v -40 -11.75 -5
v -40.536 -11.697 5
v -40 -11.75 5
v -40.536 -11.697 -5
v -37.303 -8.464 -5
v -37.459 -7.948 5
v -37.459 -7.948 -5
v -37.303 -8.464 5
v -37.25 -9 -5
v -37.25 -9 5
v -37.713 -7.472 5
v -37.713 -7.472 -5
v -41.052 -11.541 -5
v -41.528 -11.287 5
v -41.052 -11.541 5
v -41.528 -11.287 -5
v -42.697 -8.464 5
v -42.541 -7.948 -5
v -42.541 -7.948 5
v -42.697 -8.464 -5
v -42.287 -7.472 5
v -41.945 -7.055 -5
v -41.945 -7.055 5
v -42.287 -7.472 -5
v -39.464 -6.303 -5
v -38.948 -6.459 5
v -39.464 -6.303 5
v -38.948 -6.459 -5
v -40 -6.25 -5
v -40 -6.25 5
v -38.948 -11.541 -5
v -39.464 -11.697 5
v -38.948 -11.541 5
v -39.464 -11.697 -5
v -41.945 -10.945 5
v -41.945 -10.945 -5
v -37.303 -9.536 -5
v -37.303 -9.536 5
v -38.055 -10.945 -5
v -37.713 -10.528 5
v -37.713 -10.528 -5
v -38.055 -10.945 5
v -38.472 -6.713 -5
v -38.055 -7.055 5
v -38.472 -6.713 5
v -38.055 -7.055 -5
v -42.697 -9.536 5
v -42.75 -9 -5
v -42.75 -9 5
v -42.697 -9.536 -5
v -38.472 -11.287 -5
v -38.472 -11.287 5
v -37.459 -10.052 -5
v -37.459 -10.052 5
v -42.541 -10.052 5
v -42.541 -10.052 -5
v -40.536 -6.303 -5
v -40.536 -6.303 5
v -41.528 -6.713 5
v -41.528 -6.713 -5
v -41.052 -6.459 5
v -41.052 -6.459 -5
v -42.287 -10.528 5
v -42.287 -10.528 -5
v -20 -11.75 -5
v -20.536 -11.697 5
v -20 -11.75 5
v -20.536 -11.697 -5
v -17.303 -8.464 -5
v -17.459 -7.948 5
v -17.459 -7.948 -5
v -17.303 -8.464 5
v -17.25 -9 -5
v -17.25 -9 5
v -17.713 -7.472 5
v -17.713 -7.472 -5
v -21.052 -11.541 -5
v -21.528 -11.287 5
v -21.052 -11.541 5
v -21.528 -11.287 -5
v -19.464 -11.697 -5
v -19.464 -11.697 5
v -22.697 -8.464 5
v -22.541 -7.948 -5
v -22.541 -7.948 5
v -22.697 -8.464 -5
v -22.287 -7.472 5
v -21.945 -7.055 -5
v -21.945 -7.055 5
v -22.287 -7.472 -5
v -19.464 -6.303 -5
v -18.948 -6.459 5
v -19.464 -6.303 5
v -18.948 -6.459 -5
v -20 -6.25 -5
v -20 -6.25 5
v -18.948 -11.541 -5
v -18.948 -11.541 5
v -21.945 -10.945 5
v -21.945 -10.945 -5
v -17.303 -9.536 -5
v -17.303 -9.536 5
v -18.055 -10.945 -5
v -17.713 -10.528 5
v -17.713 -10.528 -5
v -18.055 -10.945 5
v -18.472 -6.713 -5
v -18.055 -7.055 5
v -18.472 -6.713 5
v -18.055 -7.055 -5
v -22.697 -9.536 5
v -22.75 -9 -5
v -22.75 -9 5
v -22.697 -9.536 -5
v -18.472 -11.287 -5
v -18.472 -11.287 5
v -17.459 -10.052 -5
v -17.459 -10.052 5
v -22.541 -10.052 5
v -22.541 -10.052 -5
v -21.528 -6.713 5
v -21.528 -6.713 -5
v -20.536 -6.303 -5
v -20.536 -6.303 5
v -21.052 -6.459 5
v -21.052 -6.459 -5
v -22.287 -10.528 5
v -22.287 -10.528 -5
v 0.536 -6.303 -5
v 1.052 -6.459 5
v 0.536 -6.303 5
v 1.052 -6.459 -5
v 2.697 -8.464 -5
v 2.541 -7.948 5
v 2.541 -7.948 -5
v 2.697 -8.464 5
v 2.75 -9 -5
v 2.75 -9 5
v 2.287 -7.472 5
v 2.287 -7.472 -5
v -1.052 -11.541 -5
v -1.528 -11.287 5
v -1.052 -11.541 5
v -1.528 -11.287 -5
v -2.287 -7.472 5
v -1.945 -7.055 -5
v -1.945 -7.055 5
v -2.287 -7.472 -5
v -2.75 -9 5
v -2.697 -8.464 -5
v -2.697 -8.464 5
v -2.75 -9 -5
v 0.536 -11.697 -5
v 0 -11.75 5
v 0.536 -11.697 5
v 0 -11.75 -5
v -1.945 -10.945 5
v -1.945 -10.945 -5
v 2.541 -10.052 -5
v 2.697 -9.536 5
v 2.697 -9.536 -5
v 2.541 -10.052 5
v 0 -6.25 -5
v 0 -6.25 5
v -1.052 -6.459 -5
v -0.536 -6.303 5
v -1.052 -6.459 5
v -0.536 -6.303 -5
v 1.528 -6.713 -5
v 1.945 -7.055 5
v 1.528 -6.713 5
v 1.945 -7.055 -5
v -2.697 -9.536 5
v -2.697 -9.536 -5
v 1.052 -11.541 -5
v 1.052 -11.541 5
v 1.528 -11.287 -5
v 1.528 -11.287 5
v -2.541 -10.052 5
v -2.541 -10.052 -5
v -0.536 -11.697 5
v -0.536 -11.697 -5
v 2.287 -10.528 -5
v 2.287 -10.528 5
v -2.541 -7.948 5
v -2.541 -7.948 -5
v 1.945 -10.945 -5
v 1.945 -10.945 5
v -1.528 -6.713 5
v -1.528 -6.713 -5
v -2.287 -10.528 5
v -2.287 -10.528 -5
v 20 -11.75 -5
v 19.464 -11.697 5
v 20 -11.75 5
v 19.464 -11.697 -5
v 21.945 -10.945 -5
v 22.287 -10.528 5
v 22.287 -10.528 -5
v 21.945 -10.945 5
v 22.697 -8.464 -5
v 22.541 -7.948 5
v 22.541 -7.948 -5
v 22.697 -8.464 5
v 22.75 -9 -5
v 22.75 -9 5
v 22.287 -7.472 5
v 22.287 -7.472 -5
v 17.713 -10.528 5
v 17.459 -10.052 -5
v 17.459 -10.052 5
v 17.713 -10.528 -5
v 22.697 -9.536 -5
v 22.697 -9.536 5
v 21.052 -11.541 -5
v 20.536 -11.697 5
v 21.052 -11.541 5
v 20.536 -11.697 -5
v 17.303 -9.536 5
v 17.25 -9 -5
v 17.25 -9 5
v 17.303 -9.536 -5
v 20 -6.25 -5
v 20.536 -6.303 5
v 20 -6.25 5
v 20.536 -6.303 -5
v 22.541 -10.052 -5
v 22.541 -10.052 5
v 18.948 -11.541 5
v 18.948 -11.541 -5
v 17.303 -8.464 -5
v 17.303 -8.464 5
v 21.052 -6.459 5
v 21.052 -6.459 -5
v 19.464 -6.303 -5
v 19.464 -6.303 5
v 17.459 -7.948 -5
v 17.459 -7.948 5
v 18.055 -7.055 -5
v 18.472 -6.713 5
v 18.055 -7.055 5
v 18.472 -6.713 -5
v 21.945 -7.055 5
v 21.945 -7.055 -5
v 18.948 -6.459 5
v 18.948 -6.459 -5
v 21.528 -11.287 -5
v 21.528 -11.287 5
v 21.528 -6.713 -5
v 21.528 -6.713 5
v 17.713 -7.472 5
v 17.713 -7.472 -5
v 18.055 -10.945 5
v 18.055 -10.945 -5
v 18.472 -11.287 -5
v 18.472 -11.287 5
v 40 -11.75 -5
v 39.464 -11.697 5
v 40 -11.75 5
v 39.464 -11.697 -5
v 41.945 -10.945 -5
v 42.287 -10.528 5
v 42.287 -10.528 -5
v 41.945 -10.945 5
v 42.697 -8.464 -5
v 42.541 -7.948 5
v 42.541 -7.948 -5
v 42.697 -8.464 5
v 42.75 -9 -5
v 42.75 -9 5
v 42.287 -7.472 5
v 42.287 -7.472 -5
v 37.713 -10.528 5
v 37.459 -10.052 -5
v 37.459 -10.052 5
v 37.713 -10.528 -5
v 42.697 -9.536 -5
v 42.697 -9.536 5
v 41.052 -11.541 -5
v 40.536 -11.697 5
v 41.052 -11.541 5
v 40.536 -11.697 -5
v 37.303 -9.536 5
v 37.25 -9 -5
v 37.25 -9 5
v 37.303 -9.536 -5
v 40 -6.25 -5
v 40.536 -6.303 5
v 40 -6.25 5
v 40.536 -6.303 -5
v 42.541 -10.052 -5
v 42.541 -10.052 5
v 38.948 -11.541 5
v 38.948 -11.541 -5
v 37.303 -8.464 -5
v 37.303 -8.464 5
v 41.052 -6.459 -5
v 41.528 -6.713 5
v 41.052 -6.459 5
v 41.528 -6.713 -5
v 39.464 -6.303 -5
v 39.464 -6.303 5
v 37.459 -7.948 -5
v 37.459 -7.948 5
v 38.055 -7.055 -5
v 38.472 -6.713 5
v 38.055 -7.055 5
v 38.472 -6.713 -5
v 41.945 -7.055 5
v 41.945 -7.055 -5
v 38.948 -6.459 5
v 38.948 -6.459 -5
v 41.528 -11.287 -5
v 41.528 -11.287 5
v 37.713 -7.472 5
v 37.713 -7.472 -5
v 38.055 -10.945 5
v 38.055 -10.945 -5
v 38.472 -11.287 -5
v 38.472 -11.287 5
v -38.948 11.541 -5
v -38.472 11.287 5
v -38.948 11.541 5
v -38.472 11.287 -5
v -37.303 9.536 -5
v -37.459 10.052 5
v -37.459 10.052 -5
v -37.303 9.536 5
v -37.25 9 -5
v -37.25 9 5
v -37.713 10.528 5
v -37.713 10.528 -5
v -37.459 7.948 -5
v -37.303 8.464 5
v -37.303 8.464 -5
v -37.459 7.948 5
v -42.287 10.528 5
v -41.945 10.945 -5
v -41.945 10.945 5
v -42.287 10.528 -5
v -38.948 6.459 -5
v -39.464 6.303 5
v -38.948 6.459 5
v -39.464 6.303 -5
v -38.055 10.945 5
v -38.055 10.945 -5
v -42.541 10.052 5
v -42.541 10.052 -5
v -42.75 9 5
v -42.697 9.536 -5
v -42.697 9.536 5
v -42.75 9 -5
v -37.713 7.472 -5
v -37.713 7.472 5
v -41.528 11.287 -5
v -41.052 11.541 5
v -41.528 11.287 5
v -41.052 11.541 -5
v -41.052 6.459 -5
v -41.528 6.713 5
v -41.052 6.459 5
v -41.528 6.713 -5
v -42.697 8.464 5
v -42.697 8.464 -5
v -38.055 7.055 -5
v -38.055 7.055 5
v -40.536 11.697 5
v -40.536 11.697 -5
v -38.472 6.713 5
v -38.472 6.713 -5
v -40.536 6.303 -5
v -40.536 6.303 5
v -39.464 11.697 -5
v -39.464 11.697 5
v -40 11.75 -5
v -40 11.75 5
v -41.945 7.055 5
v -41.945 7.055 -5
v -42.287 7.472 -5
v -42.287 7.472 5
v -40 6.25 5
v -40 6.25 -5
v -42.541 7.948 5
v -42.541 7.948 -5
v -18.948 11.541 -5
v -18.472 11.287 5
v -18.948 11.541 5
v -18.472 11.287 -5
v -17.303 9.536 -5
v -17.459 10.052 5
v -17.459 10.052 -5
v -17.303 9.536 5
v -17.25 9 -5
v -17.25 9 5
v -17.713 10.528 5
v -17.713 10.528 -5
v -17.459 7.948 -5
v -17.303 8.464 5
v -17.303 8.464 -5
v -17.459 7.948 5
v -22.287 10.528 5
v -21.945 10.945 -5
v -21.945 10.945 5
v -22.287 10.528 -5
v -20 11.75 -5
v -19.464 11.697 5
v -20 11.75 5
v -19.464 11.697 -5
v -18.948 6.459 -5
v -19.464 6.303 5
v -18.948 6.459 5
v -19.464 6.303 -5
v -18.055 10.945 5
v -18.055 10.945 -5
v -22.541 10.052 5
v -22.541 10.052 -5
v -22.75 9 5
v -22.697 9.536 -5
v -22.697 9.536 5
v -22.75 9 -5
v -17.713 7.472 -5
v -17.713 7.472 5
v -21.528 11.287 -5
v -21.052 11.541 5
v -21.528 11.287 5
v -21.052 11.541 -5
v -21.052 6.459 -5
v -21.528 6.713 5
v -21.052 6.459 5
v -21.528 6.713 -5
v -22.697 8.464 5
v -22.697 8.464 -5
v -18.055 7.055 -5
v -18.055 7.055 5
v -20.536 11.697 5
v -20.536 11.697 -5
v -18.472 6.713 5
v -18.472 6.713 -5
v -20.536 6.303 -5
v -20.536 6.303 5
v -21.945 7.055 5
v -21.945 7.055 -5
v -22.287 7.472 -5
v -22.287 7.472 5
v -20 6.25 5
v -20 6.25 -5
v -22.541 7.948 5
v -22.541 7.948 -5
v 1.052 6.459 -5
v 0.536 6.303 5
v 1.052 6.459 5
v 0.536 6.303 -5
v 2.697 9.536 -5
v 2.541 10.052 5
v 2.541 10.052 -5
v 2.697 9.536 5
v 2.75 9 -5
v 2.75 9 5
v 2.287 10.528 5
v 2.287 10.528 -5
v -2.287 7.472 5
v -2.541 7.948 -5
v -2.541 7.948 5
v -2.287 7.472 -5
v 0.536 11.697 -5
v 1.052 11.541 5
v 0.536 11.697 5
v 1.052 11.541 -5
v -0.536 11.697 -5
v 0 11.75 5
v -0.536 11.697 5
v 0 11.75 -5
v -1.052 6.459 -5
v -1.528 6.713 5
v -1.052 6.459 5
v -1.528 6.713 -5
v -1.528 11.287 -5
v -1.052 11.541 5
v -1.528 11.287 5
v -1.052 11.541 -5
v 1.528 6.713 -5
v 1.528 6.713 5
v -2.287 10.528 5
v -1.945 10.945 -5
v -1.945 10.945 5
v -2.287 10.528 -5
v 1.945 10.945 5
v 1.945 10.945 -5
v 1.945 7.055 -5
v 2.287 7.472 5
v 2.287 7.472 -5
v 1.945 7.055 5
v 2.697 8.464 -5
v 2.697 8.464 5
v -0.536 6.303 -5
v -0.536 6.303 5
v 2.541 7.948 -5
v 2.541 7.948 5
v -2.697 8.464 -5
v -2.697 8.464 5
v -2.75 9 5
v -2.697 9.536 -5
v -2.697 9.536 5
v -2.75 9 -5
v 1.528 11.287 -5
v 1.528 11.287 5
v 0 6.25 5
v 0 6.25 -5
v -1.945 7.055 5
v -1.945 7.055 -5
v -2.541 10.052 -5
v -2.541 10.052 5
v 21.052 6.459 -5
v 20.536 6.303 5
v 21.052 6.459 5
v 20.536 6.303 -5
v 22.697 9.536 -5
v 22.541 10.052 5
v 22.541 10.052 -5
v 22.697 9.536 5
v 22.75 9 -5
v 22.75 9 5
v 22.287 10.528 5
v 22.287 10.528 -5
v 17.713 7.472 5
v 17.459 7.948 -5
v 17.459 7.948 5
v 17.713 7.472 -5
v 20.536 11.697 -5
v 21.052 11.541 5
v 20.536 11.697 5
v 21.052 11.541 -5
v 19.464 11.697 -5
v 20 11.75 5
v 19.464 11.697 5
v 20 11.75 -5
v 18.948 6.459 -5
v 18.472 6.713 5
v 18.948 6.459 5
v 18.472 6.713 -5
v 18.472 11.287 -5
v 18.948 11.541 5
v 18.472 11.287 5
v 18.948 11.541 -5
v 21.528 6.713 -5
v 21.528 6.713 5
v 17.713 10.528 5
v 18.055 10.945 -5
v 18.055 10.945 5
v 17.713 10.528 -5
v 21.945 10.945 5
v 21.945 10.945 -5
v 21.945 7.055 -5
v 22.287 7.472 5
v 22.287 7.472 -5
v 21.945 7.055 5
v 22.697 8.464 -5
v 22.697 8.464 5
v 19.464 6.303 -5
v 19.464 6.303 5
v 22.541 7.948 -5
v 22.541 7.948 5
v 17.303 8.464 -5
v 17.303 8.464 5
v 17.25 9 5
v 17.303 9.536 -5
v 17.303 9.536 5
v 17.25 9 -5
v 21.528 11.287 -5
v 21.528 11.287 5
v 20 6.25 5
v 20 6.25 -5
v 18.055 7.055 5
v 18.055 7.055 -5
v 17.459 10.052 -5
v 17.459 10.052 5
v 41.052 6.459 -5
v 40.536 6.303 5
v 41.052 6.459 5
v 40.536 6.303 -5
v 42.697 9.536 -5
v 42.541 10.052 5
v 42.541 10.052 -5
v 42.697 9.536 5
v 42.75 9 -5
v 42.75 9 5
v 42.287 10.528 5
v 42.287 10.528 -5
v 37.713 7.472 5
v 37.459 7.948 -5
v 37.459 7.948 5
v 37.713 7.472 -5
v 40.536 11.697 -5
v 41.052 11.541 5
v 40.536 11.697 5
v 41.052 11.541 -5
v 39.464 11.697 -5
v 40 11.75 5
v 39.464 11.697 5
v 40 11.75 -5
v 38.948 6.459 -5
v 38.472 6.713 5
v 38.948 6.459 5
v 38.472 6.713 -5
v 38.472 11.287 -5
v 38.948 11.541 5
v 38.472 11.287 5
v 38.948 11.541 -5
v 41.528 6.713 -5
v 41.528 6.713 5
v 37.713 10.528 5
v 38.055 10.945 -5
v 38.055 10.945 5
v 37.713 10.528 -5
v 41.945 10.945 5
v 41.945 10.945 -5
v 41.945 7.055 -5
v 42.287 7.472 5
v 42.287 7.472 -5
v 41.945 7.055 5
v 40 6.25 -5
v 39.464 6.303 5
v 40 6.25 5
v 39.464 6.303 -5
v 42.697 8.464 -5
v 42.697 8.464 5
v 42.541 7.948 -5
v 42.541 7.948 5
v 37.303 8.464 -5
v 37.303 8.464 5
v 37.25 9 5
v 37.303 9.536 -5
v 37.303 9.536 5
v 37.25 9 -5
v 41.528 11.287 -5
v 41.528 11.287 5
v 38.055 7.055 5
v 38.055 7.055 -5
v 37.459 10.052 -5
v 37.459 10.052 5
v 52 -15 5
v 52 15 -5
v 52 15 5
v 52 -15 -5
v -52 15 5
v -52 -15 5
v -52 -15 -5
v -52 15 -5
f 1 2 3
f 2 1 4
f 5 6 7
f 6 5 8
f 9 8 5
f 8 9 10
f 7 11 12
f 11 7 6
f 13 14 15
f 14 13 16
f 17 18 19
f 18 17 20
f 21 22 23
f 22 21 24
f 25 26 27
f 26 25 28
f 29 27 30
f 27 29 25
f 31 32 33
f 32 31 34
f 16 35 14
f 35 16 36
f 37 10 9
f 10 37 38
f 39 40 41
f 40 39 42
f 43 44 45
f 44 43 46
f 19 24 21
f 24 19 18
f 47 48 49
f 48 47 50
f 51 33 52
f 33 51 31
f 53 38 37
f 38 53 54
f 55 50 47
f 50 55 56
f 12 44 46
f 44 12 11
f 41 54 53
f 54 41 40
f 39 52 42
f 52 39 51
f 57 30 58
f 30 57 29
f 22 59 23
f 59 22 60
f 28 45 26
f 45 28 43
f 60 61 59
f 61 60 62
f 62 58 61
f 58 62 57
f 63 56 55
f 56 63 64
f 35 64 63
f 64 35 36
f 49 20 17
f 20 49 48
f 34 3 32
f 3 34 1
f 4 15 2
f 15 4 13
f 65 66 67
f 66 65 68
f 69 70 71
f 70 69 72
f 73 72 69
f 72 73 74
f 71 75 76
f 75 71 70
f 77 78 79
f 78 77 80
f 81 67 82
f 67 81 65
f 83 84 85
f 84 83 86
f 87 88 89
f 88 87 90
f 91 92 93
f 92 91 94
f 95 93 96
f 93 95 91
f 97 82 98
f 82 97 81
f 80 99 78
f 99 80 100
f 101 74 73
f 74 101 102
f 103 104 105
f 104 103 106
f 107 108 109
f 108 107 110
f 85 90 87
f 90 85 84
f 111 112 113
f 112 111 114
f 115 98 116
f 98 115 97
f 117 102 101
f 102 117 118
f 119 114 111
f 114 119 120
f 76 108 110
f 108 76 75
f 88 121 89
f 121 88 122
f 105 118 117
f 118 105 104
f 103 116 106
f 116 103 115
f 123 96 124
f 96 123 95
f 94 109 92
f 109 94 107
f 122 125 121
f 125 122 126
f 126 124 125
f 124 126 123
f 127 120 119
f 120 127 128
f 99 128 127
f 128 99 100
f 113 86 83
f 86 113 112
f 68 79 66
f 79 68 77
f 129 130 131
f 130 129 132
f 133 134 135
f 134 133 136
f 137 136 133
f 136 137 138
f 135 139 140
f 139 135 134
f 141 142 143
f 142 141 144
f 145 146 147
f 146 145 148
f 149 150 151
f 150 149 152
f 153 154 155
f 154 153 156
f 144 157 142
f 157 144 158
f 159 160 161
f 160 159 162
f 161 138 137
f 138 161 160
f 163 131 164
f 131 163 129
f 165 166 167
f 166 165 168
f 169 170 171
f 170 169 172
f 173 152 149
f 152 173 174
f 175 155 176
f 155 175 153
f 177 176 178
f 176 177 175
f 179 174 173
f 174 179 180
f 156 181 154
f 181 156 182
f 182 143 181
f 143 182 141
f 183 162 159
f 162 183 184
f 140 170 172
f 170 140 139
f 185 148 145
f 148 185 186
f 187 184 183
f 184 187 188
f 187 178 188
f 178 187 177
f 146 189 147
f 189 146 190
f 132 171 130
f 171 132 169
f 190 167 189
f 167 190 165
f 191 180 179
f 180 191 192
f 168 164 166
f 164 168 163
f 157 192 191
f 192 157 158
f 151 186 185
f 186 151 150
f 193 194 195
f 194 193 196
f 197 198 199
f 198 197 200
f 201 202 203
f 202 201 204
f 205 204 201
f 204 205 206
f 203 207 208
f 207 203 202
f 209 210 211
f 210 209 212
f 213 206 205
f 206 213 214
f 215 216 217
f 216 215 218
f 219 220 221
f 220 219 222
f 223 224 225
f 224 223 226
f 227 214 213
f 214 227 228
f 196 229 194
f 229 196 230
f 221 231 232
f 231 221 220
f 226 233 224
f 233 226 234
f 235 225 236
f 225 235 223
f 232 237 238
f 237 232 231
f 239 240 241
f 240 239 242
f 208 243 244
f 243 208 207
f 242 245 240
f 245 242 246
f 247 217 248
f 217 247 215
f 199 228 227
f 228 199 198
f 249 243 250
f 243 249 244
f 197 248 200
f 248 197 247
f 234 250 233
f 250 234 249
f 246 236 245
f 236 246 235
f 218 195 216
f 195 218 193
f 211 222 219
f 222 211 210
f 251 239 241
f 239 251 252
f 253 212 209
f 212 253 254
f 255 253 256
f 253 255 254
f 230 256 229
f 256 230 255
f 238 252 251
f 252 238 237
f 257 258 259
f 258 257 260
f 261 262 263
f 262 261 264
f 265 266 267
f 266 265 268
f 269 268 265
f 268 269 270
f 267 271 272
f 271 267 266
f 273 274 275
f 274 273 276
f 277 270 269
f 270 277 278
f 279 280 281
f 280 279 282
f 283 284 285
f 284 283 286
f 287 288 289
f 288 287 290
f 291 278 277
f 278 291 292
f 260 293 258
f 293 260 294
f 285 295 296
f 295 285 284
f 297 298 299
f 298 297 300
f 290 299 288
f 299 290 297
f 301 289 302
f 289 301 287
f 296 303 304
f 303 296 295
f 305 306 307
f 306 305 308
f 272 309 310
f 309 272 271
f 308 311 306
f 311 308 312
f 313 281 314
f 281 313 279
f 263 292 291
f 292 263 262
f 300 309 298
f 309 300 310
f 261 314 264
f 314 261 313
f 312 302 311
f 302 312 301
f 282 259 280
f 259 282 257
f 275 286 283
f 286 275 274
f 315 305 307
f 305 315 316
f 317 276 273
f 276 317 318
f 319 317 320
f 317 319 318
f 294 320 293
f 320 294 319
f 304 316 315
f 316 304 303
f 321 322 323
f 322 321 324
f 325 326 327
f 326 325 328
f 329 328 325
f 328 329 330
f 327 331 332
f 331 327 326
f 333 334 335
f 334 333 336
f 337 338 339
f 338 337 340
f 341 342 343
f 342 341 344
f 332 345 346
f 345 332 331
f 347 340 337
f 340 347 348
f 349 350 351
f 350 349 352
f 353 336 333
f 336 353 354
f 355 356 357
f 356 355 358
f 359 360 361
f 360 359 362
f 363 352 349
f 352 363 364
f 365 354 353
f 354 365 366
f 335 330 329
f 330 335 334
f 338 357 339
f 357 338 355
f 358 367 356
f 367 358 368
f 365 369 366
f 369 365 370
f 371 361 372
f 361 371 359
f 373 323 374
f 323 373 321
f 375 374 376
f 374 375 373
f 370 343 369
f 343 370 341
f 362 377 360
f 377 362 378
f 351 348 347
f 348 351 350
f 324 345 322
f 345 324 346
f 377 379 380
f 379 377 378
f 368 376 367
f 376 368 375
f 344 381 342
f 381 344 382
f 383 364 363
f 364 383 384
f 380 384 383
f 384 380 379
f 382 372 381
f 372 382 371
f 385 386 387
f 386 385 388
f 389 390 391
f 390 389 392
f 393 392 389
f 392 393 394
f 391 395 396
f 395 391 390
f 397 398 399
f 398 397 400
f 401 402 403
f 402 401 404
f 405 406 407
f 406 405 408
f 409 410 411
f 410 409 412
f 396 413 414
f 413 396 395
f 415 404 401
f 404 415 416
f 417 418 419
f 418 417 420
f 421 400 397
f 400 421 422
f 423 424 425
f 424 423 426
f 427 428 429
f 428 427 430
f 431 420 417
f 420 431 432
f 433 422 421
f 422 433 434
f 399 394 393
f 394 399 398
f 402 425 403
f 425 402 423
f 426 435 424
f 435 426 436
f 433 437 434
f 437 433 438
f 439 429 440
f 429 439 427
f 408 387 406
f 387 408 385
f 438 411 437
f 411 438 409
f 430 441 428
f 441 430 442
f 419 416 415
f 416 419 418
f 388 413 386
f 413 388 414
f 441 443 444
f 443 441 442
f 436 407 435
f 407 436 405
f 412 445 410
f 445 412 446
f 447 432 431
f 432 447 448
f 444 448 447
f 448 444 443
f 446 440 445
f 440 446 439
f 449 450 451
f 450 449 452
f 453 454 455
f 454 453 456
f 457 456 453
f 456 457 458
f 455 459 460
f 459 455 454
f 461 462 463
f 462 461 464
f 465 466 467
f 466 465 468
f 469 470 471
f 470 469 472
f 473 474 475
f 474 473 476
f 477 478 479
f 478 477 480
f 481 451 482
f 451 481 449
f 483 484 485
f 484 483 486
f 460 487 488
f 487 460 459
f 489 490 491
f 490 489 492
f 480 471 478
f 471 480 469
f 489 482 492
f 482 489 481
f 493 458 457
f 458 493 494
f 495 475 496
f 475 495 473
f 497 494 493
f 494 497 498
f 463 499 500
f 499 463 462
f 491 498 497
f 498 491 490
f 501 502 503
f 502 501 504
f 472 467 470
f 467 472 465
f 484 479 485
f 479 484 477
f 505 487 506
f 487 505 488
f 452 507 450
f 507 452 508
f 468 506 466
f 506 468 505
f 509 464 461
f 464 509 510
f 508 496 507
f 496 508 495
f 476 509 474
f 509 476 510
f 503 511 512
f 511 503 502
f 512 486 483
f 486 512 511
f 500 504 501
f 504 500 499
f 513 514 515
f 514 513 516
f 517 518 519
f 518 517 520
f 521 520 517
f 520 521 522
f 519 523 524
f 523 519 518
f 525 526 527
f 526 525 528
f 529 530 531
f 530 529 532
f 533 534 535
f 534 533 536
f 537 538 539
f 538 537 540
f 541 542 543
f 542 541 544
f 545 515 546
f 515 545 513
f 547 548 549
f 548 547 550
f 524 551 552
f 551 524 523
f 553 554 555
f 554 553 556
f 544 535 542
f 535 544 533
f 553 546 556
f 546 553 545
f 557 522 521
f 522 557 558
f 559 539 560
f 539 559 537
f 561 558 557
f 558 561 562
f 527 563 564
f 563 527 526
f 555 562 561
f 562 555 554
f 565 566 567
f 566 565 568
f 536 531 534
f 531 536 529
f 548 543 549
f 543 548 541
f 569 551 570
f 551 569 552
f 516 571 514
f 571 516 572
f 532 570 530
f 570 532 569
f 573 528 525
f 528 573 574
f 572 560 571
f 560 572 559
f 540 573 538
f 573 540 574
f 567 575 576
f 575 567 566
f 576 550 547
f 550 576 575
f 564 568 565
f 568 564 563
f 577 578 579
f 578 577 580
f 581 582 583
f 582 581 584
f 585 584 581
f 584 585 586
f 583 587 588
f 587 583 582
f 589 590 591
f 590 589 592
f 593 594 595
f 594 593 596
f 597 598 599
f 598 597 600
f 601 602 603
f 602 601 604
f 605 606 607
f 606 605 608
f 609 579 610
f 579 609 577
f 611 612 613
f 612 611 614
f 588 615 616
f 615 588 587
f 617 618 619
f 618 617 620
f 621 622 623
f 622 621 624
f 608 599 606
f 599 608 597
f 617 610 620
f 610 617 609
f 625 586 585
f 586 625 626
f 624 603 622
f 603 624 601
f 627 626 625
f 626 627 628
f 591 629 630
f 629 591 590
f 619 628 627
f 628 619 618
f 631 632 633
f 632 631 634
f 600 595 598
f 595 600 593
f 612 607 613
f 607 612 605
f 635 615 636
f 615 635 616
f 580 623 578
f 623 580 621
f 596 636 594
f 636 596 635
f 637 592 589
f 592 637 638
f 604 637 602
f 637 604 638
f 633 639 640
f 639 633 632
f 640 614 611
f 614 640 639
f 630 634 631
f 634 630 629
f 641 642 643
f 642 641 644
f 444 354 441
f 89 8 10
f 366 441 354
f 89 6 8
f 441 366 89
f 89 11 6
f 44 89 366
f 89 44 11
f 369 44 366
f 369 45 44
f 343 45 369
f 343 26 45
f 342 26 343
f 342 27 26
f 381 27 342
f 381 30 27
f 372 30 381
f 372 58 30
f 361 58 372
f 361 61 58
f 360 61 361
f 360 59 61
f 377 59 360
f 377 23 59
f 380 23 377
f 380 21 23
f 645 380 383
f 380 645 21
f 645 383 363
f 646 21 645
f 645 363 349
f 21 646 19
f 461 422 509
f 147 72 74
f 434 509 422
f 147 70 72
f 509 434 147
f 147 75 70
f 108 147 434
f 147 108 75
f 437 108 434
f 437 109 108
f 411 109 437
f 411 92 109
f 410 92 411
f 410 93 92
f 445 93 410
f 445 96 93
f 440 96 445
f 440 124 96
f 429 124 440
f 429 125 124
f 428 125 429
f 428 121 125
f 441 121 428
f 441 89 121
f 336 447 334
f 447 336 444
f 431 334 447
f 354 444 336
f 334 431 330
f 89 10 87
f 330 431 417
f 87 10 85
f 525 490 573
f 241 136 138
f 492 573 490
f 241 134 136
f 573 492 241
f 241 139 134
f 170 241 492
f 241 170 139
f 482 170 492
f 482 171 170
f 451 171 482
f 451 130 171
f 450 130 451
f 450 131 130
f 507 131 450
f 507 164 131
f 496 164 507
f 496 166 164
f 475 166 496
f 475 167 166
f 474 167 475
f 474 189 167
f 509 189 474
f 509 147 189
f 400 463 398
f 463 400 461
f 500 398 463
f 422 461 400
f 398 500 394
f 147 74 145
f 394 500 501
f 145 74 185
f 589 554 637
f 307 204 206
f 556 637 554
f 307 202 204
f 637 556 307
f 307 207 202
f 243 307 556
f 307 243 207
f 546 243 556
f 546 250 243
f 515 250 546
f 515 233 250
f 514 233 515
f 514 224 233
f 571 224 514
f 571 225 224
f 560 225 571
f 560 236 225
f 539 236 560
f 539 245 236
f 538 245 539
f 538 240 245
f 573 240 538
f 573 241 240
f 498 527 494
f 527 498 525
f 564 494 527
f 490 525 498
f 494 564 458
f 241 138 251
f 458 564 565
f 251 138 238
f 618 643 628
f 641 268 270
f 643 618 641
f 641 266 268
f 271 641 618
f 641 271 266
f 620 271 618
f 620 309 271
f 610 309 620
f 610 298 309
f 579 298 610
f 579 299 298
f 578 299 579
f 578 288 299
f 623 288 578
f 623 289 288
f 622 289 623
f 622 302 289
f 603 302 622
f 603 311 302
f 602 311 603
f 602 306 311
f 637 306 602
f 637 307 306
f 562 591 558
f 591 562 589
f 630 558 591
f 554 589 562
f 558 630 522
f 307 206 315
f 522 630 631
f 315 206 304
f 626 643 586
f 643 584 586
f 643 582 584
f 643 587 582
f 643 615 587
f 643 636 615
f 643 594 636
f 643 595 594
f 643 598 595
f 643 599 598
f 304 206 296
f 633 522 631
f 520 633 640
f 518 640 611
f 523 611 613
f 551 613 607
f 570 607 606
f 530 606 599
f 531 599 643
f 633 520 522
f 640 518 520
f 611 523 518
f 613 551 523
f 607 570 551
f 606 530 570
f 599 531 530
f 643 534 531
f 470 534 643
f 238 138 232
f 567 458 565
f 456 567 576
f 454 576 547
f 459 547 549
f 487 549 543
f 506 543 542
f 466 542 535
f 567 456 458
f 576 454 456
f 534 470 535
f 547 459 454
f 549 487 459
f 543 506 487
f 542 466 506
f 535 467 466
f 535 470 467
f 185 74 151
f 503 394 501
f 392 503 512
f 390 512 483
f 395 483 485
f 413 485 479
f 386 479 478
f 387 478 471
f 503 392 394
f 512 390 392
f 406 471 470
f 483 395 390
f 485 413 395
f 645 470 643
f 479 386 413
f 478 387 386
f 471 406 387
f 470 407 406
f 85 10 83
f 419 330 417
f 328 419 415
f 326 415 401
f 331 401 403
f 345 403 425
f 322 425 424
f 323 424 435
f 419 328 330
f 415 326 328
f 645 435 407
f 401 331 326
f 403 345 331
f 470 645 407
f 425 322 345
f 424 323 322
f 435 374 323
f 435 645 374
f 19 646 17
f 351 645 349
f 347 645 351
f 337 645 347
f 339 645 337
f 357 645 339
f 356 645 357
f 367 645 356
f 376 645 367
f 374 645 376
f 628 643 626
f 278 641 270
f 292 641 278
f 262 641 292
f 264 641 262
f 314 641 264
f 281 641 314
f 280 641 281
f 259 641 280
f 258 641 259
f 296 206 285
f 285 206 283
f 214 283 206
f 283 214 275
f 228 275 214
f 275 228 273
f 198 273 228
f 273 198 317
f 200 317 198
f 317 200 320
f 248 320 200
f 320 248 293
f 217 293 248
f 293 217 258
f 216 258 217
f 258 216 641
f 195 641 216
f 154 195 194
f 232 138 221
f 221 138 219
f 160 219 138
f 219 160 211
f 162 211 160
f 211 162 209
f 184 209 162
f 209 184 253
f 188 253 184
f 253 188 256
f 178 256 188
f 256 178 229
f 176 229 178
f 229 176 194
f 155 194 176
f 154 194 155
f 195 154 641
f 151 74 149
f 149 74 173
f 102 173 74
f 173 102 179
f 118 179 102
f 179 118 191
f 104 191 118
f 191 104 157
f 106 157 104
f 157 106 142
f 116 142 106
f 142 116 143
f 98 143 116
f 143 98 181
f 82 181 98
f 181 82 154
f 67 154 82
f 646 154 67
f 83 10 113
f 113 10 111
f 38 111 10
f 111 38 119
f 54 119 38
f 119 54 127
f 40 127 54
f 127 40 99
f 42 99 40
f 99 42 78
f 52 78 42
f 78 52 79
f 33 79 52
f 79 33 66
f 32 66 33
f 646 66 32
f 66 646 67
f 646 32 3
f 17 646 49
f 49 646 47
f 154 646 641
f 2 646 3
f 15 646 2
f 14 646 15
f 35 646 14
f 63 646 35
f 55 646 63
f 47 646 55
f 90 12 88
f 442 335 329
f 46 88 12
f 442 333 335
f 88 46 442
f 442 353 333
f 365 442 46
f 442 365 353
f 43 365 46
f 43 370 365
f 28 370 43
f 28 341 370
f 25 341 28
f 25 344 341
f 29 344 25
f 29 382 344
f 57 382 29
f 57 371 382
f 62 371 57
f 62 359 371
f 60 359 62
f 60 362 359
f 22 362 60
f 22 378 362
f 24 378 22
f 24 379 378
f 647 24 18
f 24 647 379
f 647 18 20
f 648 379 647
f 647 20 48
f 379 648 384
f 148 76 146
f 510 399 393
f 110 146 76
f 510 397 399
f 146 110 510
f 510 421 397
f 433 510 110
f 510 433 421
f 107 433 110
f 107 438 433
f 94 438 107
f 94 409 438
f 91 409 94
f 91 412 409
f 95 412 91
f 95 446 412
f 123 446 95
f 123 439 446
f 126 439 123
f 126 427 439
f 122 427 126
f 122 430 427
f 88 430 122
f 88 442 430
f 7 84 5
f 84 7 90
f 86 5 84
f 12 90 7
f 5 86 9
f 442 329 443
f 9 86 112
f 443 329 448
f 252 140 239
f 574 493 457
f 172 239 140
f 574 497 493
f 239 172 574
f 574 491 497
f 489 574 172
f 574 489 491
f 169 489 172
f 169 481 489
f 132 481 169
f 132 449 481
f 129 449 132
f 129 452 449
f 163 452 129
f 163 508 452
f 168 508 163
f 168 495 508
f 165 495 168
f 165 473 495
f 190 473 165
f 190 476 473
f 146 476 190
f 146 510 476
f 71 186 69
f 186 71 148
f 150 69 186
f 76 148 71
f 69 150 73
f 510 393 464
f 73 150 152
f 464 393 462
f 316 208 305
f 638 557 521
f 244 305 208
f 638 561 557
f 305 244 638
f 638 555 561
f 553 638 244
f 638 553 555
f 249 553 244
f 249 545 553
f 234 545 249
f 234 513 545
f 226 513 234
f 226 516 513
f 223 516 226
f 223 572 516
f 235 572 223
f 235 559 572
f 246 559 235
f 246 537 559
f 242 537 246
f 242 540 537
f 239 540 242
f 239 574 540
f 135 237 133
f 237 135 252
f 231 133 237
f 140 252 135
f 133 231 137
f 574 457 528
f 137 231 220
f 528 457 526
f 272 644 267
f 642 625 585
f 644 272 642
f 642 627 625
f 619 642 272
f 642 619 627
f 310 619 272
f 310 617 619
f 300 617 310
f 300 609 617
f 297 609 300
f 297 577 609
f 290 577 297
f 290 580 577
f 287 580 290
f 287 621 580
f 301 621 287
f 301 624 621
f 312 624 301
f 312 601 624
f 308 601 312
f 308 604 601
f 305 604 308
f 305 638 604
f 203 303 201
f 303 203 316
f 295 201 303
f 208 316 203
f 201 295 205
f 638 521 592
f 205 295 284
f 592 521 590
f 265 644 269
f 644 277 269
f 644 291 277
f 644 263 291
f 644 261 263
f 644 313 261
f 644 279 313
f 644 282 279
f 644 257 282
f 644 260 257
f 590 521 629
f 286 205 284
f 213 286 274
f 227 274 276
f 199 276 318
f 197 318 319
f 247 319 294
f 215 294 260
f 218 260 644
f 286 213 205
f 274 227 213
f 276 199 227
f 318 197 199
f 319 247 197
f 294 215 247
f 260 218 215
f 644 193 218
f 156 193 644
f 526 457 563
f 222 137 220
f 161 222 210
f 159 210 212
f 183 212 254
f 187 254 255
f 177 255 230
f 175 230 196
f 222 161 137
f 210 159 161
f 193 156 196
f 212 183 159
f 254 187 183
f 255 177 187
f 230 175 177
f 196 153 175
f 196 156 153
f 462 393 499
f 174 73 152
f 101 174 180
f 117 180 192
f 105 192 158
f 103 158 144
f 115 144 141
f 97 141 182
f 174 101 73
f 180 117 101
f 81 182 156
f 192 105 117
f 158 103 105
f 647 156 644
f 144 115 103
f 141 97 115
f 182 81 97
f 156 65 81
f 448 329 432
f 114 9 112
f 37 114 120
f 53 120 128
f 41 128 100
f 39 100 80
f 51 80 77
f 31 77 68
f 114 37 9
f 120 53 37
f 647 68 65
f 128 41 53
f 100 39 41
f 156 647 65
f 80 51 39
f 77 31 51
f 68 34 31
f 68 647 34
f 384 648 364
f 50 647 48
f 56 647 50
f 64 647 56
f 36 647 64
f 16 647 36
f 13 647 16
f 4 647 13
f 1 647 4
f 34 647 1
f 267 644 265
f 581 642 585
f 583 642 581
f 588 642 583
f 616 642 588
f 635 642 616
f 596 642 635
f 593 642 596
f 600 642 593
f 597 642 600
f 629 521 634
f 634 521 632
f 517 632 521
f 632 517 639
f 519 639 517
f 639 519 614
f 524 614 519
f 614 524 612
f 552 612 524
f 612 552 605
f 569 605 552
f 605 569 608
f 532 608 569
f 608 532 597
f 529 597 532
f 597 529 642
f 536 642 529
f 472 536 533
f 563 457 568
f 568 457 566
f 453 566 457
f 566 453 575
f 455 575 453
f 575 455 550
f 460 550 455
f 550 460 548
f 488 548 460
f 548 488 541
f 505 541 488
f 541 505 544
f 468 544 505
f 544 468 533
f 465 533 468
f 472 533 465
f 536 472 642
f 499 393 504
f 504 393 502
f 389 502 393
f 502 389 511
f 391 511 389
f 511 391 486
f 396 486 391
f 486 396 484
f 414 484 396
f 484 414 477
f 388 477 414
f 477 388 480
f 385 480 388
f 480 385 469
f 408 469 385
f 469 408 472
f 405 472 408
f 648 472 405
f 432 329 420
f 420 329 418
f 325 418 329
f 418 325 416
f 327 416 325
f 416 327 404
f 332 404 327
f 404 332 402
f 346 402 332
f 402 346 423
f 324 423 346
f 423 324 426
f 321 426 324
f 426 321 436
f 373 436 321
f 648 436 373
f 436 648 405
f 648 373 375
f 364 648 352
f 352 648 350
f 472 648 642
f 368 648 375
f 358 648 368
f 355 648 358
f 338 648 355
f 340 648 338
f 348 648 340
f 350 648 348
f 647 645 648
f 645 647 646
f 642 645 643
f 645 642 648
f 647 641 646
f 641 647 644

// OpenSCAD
$fn = 32;

// ----------------------------------------------------------------------
// Hole bar, 5 x Ø5.5
// tworows layout, 12 mm edge offset
// ----------------------------------------------------------------------

// --- parameters (mm) ---
bar_w = 30;       // bar width (Y)
seat_tol = 0.05;  // tolerance at the seating features
free_tol = 0.3;   // general tolerance on the free sizes
bar_t = 10;       // bar thickness (Z)
holes = 5;        // holes per row
hole_d = 5.5;     // hole diameter
edge = 12;        // offset from the bar end to the first hole
pitch = 20;       // pitch between neighbouring holes
row_offset = 18;  // distance between the two rows

// --- derived feature positions (mm) ---
span = (holes - 1) * pitch;   // = 80   distance between the end holes
bar_l = span + 2 * edge;      // = 104   overall bar length
start_x = -bar_l / 2 + edge;  // = -40   X of the first hole
feature_centers = [
  [start_x + 0 * pitch, -row_offset / 2],
  [start_x + 1 * pitch, -row_offset / 2],
  [start_x + 2 * pitch, -row_offset / 2],
  [start_x + 3 * pitch, -row_offset / 2],
  [start_x + 4 * pitch, -row_offset / 2]
];   // hole centres of the first row
row2_centers = [
  [start_x + 0 * pitch, row_offset / 2],
  [start_x + 1 * pitch, row_offset / 2],
  [start_x + 2 * pitch, row_offset / 2],
  [start_x + 3 * pitch, row_offset / 2],
  [start_x + 4 * pitch, row_offset / 2]
];   // hole centres of the second row

// bar with two rows of holes, both read from their own centre arrays
difference() {
  translate([-bar_l / 2, -bar_w / 2, -bar_t / 2]) cube([bar_l, bar_w, bar_t]);
  for (centre = feature_centers)
    translate([centre[0], centre[1], 0])
      cylinder(d = hole_d, h = bar_t + 2, center = true);
  for (centre = row2_centers)
    translate([centre[0], centre[1], 0])
      cylinder(d = hole_d, h = bar_t + 2, center = true);
}
